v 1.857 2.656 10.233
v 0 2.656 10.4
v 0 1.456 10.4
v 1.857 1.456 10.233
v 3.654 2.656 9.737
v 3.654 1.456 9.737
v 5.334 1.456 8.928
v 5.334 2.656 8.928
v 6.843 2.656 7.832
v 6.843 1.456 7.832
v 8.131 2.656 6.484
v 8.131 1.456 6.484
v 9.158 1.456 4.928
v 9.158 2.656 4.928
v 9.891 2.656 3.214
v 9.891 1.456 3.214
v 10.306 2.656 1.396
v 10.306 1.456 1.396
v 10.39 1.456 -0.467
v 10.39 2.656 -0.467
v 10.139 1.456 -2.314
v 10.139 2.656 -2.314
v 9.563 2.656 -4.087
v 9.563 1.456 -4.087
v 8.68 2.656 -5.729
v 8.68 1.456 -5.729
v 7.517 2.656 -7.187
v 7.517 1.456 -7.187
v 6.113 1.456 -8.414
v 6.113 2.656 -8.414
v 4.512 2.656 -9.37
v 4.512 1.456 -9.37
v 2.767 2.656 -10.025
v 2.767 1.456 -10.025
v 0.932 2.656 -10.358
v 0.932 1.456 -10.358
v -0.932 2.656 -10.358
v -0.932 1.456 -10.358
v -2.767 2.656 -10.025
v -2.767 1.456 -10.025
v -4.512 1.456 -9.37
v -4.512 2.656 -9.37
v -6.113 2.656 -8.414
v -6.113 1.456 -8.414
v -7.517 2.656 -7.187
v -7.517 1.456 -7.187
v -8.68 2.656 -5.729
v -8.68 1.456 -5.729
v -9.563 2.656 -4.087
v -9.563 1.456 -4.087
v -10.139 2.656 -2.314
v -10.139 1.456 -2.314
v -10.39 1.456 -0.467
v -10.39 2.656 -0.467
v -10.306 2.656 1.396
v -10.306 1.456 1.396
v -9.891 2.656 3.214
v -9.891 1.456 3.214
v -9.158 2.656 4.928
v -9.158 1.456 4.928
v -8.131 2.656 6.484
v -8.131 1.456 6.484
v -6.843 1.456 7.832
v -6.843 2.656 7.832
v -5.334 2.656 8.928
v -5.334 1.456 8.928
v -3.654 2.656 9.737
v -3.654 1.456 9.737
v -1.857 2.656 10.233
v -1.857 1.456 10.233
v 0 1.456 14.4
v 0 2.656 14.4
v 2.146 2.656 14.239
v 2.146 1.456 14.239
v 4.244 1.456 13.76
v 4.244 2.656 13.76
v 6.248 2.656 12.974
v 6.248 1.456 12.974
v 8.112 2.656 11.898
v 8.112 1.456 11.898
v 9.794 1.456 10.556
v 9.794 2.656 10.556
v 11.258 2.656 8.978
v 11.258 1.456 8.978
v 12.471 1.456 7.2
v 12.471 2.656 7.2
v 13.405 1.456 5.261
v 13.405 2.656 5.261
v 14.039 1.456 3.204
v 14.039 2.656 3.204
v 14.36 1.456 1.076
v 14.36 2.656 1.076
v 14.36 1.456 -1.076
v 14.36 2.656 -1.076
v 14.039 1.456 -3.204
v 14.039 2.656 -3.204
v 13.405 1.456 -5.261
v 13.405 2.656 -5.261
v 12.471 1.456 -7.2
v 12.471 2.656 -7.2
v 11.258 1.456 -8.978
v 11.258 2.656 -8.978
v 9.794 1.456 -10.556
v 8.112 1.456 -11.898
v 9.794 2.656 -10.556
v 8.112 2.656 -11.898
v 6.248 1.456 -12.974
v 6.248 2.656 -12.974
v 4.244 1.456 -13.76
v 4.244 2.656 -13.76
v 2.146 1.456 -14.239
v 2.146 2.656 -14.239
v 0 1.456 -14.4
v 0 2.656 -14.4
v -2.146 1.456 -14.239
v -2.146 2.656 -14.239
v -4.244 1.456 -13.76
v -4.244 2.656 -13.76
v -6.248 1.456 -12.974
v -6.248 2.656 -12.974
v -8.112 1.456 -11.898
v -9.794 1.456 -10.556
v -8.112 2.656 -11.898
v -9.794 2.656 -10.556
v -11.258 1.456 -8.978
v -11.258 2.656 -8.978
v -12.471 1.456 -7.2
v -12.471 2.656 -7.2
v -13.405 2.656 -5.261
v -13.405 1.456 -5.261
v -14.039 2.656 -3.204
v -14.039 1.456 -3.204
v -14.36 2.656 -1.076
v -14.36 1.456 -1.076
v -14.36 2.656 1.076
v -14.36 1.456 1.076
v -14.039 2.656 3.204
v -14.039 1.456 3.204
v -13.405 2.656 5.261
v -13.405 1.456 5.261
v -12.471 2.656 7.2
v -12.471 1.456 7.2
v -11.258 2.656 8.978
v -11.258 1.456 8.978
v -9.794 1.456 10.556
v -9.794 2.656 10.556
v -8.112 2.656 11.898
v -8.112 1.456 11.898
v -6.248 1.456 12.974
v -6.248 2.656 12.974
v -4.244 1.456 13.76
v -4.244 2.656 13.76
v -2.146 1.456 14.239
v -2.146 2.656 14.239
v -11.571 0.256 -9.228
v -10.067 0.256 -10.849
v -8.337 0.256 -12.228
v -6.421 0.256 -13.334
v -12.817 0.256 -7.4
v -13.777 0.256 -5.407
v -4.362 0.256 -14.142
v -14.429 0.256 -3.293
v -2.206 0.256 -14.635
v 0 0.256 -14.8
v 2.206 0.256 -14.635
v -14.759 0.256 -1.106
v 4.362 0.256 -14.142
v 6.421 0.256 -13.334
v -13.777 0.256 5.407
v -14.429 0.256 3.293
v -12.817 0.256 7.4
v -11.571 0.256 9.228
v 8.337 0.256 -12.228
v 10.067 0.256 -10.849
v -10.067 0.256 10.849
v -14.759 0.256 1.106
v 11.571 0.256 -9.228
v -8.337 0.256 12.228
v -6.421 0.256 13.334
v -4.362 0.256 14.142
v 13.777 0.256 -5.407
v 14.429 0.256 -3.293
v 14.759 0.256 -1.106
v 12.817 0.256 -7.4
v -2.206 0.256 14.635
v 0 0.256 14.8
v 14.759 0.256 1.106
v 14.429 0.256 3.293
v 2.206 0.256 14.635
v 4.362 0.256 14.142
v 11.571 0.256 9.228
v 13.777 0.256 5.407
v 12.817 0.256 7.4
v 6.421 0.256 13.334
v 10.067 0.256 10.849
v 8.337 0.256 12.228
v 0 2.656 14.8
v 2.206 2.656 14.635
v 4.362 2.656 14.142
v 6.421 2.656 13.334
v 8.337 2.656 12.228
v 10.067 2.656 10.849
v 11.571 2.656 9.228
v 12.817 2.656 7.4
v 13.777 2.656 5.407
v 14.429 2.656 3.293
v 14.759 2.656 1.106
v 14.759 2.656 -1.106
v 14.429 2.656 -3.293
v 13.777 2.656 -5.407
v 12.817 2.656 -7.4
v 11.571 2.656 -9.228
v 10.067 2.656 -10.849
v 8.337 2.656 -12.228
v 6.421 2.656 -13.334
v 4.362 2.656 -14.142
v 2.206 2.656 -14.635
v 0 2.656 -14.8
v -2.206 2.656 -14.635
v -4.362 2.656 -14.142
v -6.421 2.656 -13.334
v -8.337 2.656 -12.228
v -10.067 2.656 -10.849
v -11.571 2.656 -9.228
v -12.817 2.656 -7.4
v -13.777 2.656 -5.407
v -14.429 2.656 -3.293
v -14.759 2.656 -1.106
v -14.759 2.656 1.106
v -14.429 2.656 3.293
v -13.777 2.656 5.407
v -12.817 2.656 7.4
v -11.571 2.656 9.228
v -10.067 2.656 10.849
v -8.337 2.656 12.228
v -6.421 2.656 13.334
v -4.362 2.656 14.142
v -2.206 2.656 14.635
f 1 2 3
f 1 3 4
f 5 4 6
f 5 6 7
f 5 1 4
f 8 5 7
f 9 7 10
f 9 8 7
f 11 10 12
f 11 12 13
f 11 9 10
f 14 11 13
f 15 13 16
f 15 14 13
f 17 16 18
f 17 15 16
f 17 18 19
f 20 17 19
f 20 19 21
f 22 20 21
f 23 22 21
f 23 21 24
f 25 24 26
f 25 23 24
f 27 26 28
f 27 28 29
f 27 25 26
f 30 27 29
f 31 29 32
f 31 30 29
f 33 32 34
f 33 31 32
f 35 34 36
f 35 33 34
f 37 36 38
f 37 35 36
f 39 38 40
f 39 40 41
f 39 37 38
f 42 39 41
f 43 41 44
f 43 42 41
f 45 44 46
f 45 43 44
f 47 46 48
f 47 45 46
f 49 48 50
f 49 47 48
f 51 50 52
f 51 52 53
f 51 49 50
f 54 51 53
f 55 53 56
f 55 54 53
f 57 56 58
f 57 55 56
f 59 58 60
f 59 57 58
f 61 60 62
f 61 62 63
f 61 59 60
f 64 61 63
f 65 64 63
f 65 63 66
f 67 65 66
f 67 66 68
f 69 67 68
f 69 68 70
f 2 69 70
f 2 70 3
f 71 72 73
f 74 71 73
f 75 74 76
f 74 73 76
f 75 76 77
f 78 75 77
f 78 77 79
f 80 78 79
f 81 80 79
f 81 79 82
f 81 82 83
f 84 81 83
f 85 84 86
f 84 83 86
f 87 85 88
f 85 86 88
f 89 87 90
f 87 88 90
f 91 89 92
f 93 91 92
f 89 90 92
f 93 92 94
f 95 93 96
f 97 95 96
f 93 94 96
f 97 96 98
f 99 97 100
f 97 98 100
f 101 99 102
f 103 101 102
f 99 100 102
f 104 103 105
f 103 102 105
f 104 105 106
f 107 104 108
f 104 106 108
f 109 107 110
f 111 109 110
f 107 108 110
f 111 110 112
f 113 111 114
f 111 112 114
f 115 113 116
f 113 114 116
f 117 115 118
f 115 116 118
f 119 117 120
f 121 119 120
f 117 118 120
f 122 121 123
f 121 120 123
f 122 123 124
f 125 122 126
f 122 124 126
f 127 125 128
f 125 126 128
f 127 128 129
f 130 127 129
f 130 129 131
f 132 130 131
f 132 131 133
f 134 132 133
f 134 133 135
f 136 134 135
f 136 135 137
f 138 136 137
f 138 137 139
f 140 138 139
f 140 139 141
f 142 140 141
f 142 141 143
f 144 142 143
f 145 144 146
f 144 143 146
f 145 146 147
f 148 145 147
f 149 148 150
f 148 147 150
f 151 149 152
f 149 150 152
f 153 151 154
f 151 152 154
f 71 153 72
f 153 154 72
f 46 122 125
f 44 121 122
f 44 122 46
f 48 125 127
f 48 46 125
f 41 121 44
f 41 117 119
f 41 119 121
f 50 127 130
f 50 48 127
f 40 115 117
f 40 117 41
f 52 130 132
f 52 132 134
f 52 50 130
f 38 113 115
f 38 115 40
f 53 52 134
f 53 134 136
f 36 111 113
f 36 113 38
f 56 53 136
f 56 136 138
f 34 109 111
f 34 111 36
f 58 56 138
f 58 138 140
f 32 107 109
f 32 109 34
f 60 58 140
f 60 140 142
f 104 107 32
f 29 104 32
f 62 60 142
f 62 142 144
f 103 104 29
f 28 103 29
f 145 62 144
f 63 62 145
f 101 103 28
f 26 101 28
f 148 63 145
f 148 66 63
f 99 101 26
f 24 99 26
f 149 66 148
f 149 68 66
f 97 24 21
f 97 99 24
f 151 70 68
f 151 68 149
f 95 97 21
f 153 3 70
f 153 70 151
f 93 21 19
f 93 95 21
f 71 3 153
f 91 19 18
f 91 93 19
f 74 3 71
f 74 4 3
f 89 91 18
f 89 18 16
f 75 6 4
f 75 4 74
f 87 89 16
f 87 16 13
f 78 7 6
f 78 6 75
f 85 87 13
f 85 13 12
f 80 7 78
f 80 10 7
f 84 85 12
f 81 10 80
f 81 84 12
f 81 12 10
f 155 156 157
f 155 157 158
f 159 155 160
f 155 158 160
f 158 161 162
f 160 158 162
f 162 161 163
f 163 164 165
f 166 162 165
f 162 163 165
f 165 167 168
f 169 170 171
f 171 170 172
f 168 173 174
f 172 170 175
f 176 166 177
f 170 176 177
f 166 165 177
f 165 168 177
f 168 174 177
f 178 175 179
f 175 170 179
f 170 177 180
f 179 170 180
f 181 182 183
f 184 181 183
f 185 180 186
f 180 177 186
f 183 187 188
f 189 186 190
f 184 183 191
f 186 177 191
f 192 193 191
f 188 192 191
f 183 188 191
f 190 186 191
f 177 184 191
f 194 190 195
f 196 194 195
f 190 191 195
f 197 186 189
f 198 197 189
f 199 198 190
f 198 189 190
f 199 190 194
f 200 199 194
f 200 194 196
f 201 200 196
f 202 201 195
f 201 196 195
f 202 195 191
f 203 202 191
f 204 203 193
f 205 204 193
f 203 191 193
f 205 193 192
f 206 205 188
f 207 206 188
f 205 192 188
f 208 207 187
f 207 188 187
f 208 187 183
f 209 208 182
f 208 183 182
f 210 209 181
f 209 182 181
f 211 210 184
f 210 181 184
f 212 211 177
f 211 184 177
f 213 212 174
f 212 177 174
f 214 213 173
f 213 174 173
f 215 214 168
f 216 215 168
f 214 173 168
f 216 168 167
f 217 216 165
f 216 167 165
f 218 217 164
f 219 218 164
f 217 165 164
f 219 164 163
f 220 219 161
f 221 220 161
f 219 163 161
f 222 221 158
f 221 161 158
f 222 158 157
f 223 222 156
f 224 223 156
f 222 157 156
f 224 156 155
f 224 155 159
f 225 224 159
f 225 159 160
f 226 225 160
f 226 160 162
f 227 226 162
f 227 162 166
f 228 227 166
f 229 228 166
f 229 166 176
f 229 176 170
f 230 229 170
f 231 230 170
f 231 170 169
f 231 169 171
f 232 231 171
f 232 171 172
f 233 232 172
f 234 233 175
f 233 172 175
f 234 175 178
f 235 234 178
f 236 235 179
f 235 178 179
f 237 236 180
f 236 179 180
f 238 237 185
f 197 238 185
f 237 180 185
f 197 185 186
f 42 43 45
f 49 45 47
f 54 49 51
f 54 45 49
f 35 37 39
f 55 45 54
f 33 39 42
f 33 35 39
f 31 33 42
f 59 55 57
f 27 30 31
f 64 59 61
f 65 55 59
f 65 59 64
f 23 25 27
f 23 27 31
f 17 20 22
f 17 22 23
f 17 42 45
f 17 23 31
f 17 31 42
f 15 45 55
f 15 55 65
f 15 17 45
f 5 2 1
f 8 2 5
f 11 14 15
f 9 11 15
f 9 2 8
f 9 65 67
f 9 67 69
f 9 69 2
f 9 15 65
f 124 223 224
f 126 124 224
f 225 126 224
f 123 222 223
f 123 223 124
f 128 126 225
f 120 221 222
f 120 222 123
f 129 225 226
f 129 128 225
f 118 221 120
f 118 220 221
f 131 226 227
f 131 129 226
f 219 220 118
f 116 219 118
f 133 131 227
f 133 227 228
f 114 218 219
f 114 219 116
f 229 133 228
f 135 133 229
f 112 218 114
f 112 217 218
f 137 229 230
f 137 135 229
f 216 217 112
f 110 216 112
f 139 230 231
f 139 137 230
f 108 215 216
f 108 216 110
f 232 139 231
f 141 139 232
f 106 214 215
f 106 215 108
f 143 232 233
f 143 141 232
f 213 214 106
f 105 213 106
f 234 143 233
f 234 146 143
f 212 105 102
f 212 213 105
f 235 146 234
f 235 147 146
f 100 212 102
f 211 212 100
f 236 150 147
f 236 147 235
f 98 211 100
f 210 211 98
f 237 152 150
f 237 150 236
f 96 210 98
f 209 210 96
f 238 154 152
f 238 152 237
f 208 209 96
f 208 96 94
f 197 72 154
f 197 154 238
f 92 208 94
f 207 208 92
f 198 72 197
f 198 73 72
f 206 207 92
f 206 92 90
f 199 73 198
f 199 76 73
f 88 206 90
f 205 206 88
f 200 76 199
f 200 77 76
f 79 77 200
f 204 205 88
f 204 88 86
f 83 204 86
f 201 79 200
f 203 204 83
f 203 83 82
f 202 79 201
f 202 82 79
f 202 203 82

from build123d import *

# Parameters (mm, degrees)
SKETCH1_R           = 18.5
BOSS_EXTRUDE1_DEPTH = 3
SKETCH2_R           = 18
SKETCH2_R_2         = 13
CUT_EXTRUDE1_DEPTH  = 1.5
SCALE1_SCALE        = 0.8


with BuildPart() as part:
    # Sketch1 → Boss-Extrude1 (new body)
    with BuildSketch(Plane(origin=(0, 0, 0), x_dir=(1, 0, 0), z_dir=(0, 1, 0))):
        with Locations(Location((0, 0, 0), (0, 0, 270))):
            Circle(SKETCH1_R)
    extrude(amount=BOSS_EXTRUDE1_DEPTH)

    # Sketch2 → Cut-Extrude1 (cut)
    with BuildSketch(Plane(origin=(0, 3, 0), x_dir=(1, 0, 0), z_dir=(0, 1, 0))):
        with Locations(Location((0, 0, 0), (0, 0, 270))):
            Circle(SKETCH2_R)
        with Locations(Location((0, 0, 0), (0, 0, 270))):
            Circle(SKETCH2_R_2, mode=Mode.SUBTRACT)
    extrude(amount=-CUT_EXTRUDE1_DEPTH, mode=Mode.SUBTRACT)


with BuildPart() as part_1:
    # Scale1: scaled about (0, 1.280453258, 0)
    add(part.part.scale(SCALE1_SCALE).moved(Location((0, 0.256090652, 0))))


solid = part_1.part
